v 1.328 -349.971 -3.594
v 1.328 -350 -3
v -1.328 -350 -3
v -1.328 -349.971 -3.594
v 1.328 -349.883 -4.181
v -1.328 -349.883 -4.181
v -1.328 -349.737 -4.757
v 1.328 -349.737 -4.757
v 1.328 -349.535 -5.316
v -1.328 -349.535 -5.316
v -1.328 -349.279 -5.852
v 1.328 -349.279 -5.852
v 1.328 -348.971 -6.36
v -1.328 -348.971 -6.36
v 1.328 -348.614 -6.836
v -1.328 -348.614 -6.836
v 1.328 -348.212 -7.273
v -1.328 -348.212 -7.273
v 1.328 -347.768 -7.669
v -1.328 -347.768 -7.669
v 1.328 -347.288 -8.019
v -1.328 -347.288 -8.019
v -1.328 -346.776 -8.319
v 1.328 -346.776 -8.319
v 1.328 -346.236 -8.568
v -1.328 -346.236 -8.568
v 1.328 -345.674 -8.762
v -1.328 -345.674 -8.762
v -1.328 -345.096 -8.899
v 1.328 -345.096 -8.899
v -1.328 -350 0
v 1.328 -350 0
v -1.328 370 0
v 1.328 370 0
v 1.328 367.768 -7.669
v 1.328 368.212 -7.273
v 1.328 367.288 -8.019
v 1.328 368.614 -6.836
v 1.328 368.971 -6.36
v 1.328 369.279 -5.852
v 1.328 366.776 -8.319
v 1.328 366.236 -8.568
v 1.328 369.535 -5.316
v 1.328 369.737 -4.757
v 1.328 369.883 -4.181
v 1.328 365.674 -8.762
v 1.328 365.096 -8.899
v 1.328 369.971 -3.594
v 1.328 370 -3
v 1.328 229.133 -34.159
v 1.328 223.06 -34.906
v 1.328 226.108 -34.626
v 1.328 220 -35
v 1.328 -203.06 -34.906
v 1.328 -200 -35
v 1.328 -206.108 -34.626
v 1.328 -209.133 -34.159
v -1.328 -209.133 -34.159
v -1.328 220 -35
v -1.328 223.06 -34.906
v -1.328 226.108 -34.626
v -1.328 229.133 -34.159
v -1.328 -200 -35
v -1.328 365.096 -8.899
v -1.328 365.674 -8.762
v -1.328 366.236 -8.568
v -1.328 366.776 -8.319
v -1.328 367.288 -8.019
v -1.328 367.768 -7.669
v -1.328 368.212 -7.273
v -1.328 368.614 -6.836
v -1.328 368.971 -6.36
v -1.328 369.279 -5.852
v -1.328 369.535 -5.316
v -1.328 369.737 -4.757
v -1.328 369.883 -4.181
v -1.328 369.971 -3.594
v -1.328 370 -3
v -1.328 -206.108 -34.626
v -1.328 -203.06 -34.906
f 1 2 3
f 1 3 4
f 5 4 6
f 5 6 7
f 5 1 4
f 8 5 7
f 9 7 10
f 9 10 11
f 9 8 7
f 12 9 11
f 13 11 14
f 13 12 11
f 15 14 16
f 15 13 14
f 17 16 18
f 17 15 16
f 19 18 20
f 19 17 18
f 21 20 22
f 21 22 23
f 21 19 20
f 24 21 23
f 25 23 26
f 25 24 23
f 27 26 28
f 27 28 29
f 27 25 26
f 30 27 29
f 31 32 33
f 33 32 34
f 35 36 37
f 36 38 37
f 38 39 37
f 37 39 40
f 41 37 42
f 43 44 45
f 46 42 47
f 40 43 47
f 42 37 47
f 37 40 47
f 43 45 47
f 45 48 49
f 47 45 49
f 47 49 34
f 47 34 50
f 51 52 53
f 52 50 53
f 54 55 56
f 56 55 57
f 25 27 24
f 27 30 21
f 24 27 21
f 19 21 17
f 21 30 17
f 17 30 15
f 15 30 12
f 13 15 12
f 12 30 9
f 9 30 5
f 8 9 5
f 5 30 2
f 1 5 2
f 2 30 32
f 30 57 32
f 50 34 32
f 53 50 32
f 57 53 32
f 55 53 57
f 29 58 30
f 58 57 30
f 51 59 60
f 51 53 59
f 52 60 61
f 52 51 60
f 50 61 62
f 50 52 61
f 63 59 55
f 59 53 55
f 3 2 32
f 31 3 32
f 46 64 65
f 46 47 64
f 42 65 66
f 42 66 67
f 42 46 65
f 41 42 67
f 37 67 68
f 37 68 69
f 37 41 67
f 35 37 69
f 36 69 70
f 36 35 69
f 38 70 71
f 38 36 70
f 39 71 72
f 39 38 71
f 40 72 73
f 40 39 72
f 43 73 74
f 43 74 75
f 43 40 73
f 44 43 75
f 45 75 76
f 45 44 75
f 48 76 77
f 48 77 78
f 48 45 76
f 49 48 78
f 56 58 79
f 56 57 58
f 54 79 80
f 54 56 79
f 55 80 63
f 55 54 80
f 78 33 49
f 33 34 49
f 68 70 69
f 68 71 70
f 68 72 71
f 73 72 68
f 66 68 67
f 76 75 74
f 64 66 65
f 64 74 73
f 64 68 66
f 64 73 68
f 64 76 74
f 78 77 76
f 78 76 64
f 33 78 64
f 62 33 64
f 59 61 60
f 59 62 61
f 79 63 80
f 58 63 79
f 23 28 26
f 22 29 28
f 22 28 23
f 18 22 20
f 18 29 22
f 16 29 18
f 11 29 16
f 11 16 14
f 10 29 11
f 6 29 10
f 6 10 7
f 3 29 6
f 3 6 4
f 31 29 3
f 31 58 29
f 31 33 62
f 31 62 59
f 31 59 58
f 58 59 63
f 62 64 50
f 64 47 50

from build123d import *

# Parameters (mm, degrees)
PAD_DEPTH = 1.328


with BuildPart() as part:
    # Sketch → Pad (new body, symmetric)
    with BuildSketch(Plane.YZ):
        with BuildLine():
            Line((-350, 0), (370, 0))
            Line((370, 0), (370, -3))
            ThreePointArc((365.095951, -8.899059), (368.613876, -6.835642), (370, -3))
            Line((365.095951, -8.899059), (229.132925, -34.158821))
            ThreePointArc((220, -35), (224.585791, -34.789261), (229.132925, -34.158821))
            Line((220, -35), (-200, -35))
            ThreePointArc((-209.132925, -34.158821), (-204.585791, -34.789261), (-200, -35))
            Line((-209.132925, -34.158821), (-345.095951, -8.899059))
            ThreePointArc((-350, -3), (-348.613876, -6.835642), (-345.095951, -8.899059))
            Line((-350, -3), (-350, 0))
        make_face()
    extrude(amount=PAD_DEPTH, both=True)


solid = part.part
